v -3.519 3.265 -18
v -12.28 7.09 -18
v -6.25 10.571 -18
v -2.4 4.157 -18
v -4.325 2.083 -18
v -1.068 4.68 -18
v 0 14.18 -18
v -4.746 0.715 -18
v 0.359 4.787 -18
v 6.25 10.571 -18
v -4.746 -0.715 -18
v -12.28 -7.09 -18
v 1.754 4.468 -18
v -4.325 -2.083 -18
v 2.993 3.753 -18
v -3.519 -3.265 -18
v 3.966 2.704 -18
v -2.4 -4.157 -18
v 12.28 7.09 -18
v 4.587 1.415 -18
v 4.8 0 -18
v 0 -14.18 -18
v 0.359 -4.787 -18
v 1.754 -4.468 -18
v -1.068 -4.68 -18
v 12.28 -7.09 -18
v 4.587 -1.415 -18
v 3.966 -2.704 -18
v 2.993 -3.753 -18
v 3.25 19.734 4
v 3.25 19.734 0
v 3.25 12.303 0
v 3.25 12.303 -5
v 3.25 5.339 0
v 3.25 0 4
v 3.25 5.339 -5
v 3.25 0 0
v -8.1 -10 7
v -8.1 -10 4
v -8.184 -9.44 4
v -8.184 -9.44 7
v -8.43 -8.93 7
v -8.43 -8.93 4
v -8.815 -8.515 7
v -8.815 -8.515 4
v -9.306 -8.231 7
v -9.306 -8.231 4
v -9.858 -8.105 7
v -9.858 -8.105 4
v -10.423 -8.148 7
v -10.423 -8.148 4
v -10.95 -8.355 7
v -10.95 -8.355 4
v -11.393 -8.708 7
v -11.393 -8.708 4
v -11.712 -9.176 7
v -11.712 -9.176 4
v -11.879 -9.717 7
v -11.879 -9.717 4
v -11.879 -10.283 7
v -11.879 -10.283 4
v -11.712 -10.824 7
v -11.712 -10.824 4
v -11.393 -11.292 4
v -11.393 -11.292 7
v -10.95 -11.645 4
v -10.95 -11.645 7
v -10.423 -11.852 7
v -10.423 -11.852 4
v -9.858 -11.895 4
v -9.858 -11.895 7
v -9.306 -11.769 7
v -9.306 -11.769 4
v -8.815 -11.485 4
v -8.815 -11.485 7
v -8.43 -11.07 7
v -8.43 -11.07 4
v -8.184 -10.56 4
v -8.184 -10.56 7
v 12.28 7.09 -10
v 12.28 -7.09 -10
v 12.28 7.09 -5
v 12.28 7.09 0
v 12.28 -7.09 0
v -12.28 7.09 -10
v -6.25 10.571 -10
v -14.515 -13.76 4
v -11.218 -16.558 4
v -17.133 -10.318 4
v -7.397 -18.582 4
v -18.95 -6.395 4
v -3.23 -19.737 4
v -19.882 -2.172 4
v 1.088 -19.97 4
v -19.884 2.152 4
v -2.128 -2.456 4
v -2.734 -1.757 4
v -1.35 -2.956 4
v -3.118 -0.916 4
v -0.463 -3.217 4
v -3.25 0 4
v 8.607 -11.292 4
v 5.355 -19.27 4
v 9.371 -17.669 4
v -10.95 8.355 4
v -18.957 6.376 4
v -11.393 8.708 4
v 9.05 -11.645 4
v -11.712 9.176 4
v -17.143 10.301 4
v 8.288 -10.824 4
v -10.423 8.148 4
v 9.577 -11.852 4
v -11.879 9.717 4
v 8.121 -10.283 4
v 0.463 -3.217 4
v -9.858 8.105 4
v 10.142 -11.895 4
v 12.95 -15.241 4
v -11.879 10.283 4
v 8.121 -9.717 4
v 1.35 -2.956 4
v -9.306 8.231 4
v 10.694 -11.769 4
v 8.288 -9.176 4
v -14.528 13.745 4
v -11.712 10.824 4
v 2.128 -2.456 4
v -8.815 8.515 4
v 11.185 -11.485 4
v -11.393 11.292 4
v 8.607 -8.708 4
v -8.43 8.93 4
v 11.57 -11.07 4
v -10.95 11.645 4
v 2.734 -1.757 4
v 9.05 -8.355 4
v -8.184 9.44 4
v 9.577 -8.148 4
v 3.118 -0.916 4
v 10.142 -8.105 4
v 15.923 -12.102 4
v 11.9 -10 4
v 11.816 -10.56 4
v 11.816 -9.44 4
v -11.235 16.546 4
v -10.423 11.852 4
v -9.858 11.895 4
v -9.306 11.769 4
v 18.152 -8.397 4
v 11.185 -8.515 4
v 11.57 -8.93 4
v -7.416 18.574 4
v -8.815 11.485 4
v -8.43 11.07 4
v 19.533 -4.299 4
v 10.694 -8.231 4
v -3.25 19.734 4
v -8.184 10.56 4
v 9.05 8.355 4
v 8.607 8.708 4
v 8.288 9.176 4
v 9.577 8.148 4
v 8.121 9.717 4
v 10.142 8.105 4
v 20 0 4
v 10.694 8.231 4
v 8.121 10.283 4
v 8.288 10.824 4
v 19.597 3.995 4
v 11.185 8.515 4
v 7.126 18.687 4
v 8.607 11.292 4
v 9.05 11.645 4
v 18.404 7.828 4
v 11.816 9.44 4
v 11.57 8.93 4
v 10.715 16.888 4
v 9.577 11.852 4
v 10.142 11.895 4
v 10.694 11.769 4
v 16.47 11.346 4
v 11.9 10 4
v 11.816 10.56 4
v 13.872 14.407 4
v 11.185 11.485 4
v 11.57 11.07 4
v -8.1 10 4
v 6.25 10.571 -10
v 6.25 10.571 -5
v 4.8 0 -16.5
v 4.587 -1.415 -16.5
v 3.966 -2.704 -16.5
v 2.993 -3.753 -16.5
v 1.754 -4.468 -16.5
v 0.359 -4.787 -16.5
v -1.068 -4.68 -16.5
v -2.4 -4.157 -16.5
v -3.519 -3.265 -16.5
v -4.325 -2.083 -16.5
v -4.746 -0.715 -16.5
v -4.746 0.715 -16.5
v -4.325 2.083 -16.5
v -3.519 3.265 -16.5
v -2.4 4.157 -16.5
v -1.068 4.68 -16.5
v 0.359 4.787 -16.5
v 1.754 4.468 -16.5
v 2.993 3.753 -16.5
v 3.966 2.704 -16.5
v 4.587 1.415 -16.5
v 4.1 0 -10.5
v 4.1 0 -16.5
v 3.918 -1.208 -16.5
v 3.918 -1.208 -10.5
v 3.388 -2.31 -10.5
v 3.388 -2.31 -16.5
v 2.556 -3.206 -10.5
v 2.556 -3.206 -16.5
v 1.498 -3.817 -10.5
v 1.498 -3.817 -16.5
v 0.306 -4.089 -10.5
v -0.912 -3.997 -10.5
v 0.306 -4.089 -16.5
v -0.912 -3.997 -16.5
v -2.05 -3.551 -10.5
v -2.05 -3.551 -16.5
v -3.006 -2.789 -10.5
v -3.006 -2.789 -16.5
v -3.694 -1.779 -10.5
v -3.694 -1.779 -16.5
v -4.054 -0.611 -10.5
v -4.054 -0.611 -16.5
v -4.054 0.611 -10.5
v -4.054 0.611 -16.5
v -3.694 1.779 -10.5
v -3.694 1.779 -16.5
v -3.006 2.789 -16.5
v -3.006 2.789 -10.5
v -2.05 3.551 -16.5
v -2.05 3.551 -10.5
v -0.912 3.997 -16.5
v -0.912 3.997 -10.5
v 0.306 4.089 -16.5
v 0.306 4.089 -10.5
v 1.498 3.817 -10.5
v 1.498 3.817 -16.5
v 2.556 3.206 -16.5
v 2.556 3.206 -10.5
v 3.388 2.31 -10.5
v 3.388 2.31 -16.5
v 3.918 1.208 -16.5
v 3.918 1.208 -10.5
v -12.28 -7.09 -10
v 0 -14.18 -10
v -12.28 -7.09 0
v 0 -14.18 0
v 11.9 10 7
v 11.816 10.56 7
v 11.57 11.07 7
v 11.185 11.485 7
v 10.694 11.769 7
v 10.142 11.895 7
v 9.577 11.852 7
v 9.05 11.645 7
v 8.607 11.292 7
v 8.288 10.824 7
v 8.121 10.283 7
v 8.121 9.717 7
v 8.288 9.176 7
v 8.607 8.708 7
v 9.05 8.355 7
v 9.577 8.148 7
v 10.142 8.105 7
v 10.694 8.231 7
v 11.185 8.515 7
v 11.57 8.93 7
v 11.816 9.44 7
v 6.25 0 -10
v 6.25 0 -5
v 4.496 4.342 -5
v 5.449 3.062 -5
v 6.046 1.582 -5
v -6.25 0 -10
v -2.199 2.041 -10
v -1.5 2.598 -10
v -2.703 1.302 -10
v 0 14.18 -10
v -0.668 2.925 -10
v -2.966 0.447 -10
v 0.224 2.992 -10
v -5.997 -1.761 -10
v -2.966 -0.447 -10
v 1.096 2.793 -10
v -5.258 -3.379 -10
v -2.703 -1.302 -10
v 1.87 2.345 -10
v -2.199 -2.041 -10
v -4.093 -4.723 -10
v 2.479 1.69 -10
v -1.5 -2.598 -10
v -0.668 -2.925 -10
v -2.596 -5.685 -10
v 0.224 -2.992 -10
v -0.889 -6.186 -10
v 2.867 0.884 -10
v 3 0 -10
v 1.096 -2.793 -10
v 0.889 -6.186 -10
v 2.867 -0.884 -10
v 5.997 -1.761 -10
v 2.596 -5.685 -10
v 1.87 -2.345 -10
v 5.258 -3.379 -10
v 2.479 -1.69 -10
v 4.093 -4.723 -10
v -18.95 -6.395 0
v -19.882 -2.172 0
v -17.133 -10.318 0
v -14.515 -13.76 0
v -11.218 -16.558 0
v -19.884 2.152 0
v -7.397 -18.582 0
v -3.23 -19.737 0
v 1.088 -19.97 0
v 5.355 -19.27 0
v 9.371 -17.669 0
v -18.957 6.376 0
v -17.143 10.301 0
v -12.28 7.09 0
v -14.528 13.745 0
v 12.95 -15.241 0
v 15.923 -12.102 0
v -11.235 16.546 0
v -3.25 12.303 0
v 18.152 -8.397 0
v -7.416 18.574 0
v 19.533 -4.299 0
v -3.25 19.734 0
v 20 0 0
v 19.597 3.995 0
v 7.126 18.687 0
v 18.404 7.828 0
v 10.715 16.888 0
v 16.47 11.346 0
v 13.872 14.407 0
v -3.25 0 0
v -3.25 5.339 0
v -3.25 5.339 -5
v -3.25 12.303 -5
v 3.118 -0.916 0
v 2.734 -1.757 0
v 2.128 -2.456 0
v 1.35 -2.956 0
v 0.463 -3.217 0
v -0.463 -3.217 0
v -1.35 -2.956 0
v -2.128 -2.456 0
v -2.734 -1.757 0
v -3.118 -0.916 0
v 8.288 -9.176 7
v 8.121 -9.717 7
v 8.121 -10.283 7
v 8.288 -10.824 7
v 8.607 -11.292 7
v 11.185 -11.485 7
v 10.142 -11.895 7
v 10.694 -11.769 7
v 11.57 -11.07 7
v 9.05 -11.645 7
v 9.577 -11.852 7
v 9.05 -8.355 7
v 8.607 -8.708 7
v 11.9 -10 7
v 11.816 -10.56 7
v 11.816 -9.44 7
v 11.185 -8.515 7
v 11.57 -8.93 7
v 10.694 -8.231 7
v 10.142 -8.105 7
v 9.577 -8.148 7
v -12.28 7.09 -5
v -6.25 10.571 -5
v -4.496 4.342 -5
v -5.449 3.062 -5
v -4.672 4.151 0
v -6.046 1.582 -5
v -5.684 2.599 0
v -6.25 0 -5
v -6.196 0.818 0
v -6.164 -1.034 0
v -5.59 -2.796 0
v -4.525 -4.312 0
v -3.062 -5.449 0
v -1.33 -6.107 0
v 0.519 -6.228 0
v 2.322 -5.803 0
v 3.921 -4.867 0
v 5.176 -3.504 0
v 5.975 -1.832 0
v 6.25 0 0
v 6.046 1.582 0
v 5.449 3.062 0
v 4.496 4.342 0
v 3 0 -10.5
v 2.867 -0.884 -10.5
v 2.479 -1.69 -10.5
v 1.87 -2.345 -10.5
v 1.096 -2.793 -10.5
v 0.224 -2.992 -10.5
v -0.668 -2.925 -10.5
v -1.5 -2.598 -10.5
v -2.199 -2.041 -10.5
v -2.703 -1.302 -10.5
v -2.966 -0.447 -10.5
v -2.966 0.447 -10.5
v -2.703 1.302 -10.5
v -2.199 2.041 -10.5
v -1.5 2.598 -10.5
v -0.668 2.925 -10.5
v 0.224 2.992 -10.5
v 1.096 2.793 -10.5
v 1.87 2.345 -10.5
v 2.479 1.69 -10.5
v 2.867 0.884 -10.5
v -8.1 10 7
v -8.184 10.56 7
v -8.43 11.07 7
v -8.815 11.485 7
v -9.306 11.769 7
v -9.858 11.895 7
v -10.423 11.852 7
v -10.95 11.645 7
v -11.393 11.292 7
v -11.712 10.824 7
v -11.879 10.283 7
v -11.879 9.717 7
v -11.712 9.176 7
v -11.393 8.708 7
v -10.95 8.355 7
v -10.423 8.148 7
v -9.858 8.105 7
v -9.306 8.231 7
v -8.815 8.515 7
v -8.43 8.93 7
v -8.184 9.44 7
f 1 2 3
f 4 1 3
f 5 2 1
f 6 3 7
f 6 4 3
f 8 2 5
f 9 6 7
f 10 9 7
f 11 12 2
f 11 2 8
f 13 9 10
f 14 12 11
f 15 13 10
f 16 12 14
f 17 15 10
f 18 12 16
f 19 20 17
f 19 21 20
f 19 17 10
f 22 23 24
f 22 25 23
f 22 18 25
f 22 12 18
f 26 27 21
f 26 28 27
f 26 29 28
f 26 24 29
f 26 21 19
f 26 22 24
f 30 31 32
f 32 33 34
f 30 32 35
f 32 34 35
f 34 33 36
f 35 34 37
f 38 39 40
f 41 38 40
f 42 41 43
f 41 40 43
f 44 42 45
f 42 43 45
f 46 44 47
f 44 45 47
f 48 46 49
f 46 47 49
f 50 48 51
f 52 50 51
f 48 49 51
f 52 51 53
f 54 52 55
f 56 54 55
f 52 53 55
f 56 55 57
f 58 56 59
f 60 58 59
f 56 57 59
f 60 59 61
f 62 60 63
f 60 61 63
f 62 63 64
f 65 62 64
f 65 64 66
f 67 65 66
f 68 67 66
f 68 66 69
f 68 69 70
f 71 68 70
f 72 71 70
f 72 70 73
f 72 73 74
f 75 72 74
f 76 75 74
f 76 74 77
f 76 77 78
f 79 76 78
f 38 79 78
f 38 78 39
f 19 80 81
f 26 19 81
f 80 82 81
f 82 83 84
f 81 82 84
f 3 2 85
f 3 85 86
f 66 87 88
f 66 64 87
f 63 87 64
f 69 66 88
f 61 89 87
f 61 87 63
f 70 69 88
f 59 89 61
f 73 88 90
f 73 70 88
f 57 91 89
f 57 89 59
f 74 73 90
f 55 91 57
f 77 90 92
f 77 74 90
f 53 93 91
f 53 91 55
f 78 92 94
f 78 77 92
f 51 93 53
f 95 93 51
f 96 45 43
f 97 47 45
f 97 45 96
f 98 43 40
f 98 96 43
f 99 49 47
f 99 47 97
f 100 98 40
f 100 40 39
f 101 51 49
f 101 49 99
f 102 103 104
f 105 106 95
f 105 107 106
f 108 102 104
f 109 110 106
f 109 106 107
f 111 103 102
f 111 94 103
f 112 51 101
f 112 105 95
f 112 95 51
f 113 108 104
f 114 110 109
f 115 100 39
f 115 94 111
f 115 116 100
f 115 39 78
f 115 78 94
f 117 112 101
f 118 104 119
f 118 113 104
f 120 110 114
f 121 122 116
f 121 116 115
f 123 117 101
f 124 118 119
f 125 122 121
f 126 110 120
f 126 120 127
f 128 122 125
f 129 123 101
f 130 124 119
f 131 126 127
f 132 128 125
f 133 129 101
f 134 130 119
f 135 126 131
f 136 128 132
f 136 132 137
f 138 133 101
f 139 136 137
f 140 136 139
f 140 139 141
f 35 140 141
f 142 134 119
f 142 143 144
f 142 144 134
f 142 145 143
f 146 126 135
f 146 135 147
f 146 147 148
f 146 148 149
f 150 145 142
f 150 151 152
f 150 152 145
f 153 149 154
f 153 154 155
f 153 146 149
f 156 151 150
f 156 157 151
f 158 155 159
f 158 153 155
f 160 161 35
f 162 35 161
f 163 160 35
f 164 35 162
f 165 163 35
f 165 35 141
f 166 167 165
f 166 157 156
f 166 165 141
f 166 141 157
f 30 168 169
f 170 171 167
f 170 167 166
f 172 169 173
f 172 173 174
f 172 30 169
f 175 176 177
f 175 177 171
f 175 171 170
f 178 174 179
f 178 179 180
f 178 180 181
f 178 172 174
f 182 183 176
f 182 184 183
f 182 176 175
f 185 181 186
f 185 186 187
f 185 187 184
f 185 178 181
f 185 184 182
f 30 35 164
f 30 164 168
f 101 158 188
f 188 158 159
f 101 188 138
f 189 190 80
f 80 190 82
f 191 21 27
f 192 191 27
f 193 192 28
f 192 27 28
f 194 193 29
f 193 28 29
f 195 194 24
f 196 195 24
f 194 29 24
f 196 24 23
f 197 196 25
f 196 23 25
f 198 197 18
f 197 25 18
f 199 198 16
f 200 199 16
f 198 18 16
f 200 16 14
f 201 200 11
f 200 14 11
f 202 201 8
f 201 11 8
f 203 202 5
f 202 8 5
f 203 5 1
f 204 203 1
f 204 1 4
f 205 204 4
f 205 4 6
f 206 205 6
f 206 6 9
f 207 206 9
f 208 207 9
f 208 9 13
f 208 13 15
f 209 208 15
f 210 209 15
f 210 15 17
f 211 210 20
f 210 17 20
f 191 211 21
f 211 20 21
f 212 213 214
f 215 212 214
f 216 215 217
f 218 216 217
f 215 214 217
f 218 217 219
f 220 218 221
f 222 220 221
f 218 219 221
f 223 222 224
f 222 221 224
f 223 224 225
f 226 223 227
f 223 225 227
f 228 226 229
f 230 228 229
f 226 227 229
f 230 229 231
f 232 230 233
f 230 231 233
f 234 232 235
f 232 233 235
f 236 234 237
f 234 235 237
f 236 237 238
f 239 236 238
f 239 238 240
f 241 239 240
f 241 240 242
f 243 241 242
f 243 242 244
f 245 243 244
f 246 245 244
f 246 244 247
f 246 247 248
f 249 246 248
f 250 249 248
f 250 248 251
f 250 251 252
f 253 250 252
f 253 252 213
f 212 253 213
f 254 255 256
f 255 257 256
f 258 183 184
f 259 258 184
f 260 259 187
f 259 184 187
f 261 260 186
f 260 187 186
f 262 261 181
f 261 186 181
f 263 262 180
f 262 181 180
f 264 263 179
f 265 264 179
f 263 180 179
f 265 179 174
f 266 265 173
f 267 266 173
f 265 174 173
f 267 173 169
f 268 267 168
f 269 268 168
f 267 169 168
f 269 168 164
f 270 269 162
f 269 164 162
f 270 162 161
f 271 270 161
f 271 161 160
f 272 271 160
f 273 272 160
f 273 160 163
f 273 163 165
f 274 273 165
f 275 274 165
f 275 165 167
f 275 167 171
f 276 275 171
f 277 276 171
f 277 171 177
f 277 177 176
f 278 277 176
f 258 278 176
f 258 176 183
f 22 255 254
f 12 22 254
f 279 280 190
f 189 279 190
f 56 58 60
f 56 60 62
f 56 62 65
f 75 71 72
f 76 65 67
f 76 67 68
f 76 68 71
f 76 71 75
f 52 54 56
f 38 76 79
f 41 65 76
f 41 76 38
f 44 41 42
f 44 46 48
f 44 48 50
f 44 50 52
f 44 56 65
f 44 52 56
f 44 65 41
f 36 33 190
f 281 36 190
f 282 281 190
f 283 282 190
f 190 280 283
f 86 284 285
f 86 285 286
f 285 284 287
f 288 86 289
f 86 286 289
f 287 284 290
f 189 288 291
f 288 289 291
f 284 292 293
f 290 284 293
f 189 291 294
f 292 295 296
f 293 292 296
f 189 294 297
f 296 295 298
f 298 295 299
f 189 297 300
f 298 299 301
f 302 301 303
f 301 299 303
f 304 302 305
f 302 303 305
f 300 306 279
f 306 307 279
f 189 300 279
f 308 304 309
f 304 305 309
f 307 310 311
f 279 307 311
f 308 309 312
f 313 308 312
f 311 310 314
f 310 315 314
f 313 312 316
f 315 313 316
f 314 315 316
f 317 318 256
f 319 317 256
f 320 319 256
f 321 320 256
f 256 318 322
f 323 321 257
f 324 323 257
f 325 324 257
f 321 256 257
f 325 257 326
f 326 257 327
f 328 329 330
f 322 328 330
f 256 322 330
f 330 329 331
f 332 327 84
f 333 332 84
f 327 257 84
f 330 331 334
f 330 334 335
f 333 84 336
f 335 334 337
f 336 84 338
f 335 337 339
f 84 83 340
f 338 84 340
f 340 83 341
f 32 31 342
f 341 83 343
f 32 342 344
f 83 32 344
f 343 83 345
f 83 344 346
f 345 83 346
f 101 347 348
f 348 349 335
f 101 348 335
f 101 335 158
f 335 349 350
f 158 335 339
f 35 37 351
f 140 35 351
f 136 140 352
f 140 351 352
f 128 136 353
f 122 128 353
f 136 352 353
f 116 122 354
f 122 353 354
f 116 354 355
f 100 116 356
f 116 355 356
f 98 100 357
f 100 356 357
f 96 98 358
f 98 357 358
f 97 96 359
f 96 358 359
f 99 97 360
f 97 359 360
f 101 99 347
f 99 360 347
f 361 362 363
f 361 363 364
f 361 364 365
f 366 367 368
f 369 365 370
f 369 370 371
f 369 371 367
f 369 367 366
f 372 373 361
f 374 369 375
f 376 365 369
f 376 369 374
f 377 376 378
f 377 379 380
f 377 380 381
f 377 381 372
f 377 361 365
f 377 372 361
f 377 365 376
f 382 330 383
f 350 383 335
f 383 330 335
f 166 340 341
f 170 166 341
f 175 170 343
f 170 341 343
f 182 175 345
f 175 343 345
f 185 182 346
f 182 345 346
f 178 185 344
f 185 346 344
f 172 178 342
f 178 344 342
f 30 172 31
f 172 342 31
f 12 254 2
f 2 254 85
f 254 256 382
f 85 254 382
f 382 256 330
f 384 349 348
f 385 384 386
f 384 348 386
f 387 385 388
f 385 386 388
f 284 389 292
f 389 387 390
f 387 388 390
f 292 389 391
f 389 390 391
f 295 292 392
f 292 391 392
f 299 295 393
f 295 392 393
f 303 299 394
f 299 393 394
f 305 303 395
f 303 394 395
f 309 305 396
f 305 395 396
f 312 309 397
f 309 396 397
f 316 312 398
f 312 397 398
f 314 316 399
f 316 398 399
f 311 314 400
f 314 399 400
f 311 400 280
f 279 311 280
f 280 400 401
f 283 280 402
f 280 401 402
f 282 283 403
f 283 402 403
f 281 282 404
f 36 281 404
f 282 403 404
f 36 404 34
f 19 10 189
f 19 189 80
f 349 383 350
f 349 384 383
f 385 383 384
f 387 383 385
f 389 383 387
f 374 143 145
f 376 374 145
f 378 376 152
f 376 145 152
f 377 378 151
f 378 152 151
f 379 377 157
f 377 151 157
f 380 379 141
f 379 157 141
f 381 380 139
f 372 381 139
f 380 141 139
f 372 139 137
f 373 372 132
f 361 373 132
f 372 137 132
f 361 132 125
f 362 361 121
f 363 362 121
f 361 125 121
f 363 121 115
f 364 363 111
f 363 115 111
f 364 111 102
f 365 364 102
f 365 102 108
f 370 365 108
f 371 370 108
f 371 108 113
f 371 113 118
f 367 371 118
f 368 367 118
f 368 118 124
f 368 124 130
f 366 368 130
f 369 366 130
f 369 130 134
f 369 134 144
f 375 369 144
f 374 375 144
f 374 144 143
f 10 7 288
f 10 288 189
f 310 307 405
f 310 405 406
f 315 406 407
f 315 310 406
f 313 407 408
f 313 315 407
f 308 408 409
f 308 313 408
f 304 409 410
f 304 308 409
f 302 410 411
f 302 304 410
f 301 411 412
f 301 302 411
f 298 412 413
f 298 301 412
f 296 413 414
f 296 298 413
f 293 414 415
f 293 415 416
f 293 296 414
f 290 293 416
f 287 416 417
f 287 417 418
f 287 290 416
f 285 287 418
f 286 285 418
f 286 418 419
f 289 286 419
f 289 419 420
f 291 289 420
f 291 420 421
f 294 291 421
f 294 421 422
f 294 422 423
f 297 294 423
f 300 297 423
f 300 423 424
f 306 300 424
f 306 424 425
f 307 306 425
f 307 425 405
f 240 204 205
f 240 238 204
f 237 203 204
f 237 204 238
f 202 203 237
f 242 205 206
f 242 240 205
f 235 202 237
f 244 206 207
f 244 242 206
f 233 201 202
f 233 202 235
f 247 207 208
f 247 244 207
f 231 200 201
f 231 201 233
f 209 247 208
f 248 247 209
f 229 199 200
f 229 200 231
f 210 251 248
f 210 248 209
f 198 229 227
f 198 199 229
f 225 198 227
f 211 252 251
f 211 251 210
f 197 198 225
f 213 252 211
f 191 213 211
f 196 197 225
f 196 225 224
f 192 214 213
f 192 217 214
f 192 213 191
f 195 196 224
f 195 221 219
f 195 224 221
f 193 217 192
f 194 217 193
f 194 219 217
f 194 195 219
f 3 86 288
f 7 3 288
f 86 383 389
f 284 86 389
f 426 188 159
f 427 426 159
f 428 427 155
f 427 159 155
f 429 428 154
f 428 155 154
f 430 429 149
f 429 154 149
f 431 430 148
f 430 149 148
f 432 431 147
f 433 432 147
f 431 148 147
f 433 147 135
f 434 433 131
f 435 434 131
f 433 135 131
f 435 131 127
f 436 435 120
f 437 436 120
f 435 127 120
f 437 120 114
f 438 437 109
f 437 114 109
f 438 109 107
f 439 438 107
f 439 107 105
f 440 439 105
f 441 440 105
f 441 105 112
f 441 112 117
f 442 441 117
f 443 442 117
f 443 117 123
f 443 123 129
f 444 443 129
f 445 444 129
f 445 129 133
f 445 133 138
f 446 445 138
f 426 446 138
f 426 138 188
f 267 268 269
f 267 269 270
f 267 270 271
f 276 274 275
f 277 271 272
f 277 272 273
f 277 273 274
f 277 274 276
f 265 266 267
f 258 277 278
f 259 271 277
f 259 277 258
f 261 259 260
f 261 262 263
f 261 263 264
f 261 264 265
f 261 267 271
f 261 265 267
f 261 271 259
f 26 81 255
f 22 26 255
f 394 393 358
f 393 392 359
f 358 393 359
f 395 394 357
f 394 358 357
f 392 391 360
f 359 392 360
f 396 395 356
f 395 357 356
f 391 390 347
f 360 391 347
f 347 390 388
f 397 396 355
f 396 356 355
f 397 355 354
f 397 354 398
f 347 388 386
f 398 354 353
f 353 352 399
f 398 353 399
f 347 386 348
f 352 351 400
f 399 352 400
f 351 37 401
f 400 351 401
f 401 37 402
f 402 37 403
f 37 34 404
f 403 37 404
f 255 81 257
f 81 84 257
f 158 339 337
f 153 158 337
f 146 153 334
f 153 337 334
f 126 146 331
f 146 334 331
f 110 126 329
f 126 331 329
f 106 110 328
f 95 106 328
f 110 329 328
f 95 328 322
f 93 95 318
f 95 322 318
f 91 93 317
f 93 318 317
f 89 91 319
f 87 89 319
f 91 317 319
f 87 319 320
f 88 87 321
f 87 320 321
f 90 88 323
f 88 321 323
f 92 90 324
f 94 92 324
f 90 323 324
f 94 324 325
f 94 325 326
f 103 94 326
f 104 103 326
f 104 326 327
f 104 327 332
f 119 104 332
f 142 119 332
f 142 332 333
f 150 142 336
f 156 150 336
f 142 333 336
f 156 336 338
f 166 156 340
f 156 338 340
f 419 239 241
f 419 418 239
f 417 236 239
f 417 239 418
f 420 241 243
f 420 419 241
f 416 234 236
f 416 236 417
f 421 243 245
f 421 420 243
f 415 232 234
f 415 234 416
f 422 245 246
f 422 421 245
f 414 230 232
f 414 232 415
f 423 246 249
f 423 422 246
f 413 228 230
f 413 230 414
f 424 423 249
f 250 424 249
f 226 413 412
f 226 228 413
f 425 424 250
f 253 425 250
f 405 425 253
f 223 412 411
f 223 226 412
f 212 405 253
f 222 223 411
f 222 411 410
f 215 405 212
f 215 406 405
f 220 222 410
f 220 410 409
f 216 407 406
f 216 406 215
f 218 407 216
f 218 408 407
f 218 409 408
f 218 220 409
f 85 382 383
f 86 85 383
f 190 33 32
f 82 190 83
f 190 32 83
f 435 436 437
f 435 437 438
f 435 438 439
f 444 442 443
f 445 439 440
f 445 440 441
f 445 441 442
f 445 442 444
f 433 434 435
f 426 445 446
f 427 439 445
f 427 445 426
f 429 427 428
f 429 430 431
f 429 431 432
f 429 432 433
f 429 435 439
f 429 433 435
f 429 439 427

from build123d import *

# Parameters (mm, degrees)
F0_R      = 1.9
F1_DEPTH  = 4
F2_DEPTH  = 7
F4_DEPTH  = 5
F6_DEPTH  = 5
F7_R      = 3
F8_DEPTH  = 8
F9_R      = 4.8
F9_R_2    = 4.1
F10_DEPTH = 1.5
F9_R_3    = 3
F11_DEPTH = 7.5


with BuildPart() as f1:
    # F0 (on Top) → F1 (new body)
    with BuildSketch(Plane.XY):
        with BuildLine():
            ThreePointArc((-3.25, 19.7341708719), (-12.9421791055, -15.247950682), (20, 0))
            ThreePointArc((20, 0), (15.247950682, 12.9421791055), (3.25, 19.7341708719))
            Line((3.25, 19.7341708719), (3.25, 0))
            ThreePointArc((3.25, 0), (0, -3.25), (-3.25, 0))
            Line((-3.25, 0), (-3.25, 19.7341708719))
        make_face()
        with Locations((-10, -10)):
            Circle(F0_R, mode=Mode.SUBTRACT)
        with Locations((10, -10)):
            Circle(F0_R, mode=Mode.SUBTRACT)
        with Locations((-10, 10)):
            Circle(F0_R, mode=Mode.SUBTRACT)
        with Locations((10, 10)):
            Circle(F0_R, mode=Mode.SUBTRACT)
        with Locations((-10, 10)):
            Circle(F0_R)
        with Locations((10, 10)):
            Circle(F0_R)
        with Locations((10, -10)):
            Circle(F0_R)
        with Locations((-10, -10)):
            Circle(F0_R)
    extrude(amount=F1_DEPTH)

    # F0 (on Top) → F2 (join)
    with BuildSketch(Plane.XY):
        with Locations((-10, 10)):
            Circle(F0_R)
        with Locations((10, 10)):
            Circle(F0_R)
        with Locations((10, -10)):
            Circle(F0_R)
        with Locations((-10, -10)):
            Circle(F0_R)
    extrude(amount=F2_DEPTH)

    # F3 (on face) → F4 (join)
    with BuildSketch(Plane(origin=(0, 0, 0), x_dir=(1, 0, 0), z_dir=(0, 0, -1))):
        with BuildLine():
            ThreePointArc((-3.25, -5.338539126), (-3.0618621785, 5.4486236794), (6.25, 0))
            ThreePointArc((6.25, 0), (5.4486236794, -3.0618621785), (3.25, -5.338539126))
            Line((3.25, -5.338539126), (3.25, -12.3031496292))
            Line((3.25, -12.3031496292), (12.2798401255, -7.0897690021))
            Line((12.2798401255, -7.0897690021), (12.2798401255, 7.0897690021))
            Line((12.2798401255, 7.0897690021), (0, 14.1795380041))
            Line((0, 14.1795380041), (-12.2798401255, 7.0897690021))
            Line((-12.2798401255, 7.0897690021), (-12.2798401255, -7.0897690021))
            Line((-12.2798401255, -7.0897690021), (-3.25, -12.3031496292))
            Line((-3.25, -12.3031496292), (-3.25, -5.338539126))
        make_face()
    extrude(amount=F4_DEPTH)

    # F5 (on face) → F6 (join)
    with BuildSketch(Plane(origin=(0, 0, -5), x_dir=(1, 0, 0), z_dir=(0, 0, -1))):
        with BuildLine():
            ThreePointArc((-6.25, 0), (0, 6.25), (6.25, 0))
            Line((6.25, 0), (6.25, -10.5710988217))
            Line((6.25, -10.5710988217), (12.2798401255, -7.0897690021))
            Line((12.2798401255, -7.0897690021), (12.2798401255, 7.0897690021))
            Line((12.2798401255, 7.0897690021), (0, 14.1795380041))
            Line((0, 14.1795380041), (-12.2798401255, 7.0897690021))
            Line((-12.2798401255, 7.0897690021), (-12.2798401255, -7.0897690021))
            Line((-12.2798401255, -7.0897690021), (-6.25, -10.5710988217))
            Line((-6.25, -10.5710988217), (-6.25, 0))
        make_face()
    extrude(amount=F6_DEPTH)

    # F7 (on face) → F8 (join)
    with BuildSketch(Plane(origin=(0, 0, -10), x_dir=(1, 0, 0), z_dir=(0, 0, -1))):
        with BuildLine():
            ThreePointArc((-6.2500000608, 0), (-7.83e-08, 6.2500000351), (6.2499999392, 3.51e-08))
            Line((6.25, 0), (6.25, -10.5710988217))
            Line((6.2499999696, -10.571098769), (12.2798400647, -7.089768967))
            Line((12.2798400647, -7.089768967), (12.2798400647, 7.0897690371))
            Line((12.2798400647, 7.0897690371), (-6.08e-08, 14.1795380392))
            Line((-6.08e-08, 14.1795380392), (-12.2798401862, 7.0897690371))
            Line((-12.2798401862, 7.0897690371), (-12.2798401862, -7.089768967))
            Line((-12.2798401862, -7.089768967), (-6.25, -10.5710988217))
            Line((-6.25, -10.5710988217), (-6.25, 0))
        make_face()
        with BuildLine():
            ThreePointArc((-6.2500000608, 0), (-4.32e-08, -6.2499999649), (6.2499999392, 3.51e-08))
            ThreePointArc((6.2499999392, 3.51e-08), (-7.83e-08, 6.2500000351), (-6.2500000608, 0))
        make_face()
        with Locations((-6.08e-08, 3.51e-08)):
            Circle(F7_R, mode=Mode.SUBTRACT)
        with BuildLine():
            Line((6.25, -10.5710988217), (6.25, 0))
            ThreePointArc((6.2499999392, 3.51e-08), (-4.32e-08, -6.2499999649), (-6.2500000608, 0))
            Line((-6.25, 0), (-6.25, -10.5710988217))
            Line((-6.25, -10.5710988217), (-6.08e-08, -14.179537969))
            Line((-6.08e-08, -14.179537969), (6.2499999696, -10.571098769))
        make_face()
    extrude(amount=F8_DEPTH)

    # F9 (on face) → F10 (cut)
    with BuildSketch(Plane(origin=(0, 0, -18), x_dir=(1, 0, 0), z_dir=(0, 0, -1))):
        with Locations((-6.08e-08, 3.51e-08)):
            Circle(F9_R)
        with Locations((-6.08e-08, 3.51e-08)):
            Circle(F9_R_2, mode=Mode.SUBTRACT)
    extrude(amount=-F10_DEPTH, mode=Mode.SUBTRACT)

    # F9 (on face) → F11 (cut)
    with BuildSketch(Plane(origin=(0, 0, -18), x_dir=(1, 0, 0), z_dir=(0, 0, -1))):
        with Locations((-6.08e-08, 3.51e-08)):
            Circle(F9_R_2)
        with Locations((-6.08e-08, 3.51e-08)):
            Circle(F9_R_3, mode=Mode.SUBTRACT)
    extrude(amount=-F11_DEPTH, mode=Mode.SUBTRACT)


solid = f1.part
